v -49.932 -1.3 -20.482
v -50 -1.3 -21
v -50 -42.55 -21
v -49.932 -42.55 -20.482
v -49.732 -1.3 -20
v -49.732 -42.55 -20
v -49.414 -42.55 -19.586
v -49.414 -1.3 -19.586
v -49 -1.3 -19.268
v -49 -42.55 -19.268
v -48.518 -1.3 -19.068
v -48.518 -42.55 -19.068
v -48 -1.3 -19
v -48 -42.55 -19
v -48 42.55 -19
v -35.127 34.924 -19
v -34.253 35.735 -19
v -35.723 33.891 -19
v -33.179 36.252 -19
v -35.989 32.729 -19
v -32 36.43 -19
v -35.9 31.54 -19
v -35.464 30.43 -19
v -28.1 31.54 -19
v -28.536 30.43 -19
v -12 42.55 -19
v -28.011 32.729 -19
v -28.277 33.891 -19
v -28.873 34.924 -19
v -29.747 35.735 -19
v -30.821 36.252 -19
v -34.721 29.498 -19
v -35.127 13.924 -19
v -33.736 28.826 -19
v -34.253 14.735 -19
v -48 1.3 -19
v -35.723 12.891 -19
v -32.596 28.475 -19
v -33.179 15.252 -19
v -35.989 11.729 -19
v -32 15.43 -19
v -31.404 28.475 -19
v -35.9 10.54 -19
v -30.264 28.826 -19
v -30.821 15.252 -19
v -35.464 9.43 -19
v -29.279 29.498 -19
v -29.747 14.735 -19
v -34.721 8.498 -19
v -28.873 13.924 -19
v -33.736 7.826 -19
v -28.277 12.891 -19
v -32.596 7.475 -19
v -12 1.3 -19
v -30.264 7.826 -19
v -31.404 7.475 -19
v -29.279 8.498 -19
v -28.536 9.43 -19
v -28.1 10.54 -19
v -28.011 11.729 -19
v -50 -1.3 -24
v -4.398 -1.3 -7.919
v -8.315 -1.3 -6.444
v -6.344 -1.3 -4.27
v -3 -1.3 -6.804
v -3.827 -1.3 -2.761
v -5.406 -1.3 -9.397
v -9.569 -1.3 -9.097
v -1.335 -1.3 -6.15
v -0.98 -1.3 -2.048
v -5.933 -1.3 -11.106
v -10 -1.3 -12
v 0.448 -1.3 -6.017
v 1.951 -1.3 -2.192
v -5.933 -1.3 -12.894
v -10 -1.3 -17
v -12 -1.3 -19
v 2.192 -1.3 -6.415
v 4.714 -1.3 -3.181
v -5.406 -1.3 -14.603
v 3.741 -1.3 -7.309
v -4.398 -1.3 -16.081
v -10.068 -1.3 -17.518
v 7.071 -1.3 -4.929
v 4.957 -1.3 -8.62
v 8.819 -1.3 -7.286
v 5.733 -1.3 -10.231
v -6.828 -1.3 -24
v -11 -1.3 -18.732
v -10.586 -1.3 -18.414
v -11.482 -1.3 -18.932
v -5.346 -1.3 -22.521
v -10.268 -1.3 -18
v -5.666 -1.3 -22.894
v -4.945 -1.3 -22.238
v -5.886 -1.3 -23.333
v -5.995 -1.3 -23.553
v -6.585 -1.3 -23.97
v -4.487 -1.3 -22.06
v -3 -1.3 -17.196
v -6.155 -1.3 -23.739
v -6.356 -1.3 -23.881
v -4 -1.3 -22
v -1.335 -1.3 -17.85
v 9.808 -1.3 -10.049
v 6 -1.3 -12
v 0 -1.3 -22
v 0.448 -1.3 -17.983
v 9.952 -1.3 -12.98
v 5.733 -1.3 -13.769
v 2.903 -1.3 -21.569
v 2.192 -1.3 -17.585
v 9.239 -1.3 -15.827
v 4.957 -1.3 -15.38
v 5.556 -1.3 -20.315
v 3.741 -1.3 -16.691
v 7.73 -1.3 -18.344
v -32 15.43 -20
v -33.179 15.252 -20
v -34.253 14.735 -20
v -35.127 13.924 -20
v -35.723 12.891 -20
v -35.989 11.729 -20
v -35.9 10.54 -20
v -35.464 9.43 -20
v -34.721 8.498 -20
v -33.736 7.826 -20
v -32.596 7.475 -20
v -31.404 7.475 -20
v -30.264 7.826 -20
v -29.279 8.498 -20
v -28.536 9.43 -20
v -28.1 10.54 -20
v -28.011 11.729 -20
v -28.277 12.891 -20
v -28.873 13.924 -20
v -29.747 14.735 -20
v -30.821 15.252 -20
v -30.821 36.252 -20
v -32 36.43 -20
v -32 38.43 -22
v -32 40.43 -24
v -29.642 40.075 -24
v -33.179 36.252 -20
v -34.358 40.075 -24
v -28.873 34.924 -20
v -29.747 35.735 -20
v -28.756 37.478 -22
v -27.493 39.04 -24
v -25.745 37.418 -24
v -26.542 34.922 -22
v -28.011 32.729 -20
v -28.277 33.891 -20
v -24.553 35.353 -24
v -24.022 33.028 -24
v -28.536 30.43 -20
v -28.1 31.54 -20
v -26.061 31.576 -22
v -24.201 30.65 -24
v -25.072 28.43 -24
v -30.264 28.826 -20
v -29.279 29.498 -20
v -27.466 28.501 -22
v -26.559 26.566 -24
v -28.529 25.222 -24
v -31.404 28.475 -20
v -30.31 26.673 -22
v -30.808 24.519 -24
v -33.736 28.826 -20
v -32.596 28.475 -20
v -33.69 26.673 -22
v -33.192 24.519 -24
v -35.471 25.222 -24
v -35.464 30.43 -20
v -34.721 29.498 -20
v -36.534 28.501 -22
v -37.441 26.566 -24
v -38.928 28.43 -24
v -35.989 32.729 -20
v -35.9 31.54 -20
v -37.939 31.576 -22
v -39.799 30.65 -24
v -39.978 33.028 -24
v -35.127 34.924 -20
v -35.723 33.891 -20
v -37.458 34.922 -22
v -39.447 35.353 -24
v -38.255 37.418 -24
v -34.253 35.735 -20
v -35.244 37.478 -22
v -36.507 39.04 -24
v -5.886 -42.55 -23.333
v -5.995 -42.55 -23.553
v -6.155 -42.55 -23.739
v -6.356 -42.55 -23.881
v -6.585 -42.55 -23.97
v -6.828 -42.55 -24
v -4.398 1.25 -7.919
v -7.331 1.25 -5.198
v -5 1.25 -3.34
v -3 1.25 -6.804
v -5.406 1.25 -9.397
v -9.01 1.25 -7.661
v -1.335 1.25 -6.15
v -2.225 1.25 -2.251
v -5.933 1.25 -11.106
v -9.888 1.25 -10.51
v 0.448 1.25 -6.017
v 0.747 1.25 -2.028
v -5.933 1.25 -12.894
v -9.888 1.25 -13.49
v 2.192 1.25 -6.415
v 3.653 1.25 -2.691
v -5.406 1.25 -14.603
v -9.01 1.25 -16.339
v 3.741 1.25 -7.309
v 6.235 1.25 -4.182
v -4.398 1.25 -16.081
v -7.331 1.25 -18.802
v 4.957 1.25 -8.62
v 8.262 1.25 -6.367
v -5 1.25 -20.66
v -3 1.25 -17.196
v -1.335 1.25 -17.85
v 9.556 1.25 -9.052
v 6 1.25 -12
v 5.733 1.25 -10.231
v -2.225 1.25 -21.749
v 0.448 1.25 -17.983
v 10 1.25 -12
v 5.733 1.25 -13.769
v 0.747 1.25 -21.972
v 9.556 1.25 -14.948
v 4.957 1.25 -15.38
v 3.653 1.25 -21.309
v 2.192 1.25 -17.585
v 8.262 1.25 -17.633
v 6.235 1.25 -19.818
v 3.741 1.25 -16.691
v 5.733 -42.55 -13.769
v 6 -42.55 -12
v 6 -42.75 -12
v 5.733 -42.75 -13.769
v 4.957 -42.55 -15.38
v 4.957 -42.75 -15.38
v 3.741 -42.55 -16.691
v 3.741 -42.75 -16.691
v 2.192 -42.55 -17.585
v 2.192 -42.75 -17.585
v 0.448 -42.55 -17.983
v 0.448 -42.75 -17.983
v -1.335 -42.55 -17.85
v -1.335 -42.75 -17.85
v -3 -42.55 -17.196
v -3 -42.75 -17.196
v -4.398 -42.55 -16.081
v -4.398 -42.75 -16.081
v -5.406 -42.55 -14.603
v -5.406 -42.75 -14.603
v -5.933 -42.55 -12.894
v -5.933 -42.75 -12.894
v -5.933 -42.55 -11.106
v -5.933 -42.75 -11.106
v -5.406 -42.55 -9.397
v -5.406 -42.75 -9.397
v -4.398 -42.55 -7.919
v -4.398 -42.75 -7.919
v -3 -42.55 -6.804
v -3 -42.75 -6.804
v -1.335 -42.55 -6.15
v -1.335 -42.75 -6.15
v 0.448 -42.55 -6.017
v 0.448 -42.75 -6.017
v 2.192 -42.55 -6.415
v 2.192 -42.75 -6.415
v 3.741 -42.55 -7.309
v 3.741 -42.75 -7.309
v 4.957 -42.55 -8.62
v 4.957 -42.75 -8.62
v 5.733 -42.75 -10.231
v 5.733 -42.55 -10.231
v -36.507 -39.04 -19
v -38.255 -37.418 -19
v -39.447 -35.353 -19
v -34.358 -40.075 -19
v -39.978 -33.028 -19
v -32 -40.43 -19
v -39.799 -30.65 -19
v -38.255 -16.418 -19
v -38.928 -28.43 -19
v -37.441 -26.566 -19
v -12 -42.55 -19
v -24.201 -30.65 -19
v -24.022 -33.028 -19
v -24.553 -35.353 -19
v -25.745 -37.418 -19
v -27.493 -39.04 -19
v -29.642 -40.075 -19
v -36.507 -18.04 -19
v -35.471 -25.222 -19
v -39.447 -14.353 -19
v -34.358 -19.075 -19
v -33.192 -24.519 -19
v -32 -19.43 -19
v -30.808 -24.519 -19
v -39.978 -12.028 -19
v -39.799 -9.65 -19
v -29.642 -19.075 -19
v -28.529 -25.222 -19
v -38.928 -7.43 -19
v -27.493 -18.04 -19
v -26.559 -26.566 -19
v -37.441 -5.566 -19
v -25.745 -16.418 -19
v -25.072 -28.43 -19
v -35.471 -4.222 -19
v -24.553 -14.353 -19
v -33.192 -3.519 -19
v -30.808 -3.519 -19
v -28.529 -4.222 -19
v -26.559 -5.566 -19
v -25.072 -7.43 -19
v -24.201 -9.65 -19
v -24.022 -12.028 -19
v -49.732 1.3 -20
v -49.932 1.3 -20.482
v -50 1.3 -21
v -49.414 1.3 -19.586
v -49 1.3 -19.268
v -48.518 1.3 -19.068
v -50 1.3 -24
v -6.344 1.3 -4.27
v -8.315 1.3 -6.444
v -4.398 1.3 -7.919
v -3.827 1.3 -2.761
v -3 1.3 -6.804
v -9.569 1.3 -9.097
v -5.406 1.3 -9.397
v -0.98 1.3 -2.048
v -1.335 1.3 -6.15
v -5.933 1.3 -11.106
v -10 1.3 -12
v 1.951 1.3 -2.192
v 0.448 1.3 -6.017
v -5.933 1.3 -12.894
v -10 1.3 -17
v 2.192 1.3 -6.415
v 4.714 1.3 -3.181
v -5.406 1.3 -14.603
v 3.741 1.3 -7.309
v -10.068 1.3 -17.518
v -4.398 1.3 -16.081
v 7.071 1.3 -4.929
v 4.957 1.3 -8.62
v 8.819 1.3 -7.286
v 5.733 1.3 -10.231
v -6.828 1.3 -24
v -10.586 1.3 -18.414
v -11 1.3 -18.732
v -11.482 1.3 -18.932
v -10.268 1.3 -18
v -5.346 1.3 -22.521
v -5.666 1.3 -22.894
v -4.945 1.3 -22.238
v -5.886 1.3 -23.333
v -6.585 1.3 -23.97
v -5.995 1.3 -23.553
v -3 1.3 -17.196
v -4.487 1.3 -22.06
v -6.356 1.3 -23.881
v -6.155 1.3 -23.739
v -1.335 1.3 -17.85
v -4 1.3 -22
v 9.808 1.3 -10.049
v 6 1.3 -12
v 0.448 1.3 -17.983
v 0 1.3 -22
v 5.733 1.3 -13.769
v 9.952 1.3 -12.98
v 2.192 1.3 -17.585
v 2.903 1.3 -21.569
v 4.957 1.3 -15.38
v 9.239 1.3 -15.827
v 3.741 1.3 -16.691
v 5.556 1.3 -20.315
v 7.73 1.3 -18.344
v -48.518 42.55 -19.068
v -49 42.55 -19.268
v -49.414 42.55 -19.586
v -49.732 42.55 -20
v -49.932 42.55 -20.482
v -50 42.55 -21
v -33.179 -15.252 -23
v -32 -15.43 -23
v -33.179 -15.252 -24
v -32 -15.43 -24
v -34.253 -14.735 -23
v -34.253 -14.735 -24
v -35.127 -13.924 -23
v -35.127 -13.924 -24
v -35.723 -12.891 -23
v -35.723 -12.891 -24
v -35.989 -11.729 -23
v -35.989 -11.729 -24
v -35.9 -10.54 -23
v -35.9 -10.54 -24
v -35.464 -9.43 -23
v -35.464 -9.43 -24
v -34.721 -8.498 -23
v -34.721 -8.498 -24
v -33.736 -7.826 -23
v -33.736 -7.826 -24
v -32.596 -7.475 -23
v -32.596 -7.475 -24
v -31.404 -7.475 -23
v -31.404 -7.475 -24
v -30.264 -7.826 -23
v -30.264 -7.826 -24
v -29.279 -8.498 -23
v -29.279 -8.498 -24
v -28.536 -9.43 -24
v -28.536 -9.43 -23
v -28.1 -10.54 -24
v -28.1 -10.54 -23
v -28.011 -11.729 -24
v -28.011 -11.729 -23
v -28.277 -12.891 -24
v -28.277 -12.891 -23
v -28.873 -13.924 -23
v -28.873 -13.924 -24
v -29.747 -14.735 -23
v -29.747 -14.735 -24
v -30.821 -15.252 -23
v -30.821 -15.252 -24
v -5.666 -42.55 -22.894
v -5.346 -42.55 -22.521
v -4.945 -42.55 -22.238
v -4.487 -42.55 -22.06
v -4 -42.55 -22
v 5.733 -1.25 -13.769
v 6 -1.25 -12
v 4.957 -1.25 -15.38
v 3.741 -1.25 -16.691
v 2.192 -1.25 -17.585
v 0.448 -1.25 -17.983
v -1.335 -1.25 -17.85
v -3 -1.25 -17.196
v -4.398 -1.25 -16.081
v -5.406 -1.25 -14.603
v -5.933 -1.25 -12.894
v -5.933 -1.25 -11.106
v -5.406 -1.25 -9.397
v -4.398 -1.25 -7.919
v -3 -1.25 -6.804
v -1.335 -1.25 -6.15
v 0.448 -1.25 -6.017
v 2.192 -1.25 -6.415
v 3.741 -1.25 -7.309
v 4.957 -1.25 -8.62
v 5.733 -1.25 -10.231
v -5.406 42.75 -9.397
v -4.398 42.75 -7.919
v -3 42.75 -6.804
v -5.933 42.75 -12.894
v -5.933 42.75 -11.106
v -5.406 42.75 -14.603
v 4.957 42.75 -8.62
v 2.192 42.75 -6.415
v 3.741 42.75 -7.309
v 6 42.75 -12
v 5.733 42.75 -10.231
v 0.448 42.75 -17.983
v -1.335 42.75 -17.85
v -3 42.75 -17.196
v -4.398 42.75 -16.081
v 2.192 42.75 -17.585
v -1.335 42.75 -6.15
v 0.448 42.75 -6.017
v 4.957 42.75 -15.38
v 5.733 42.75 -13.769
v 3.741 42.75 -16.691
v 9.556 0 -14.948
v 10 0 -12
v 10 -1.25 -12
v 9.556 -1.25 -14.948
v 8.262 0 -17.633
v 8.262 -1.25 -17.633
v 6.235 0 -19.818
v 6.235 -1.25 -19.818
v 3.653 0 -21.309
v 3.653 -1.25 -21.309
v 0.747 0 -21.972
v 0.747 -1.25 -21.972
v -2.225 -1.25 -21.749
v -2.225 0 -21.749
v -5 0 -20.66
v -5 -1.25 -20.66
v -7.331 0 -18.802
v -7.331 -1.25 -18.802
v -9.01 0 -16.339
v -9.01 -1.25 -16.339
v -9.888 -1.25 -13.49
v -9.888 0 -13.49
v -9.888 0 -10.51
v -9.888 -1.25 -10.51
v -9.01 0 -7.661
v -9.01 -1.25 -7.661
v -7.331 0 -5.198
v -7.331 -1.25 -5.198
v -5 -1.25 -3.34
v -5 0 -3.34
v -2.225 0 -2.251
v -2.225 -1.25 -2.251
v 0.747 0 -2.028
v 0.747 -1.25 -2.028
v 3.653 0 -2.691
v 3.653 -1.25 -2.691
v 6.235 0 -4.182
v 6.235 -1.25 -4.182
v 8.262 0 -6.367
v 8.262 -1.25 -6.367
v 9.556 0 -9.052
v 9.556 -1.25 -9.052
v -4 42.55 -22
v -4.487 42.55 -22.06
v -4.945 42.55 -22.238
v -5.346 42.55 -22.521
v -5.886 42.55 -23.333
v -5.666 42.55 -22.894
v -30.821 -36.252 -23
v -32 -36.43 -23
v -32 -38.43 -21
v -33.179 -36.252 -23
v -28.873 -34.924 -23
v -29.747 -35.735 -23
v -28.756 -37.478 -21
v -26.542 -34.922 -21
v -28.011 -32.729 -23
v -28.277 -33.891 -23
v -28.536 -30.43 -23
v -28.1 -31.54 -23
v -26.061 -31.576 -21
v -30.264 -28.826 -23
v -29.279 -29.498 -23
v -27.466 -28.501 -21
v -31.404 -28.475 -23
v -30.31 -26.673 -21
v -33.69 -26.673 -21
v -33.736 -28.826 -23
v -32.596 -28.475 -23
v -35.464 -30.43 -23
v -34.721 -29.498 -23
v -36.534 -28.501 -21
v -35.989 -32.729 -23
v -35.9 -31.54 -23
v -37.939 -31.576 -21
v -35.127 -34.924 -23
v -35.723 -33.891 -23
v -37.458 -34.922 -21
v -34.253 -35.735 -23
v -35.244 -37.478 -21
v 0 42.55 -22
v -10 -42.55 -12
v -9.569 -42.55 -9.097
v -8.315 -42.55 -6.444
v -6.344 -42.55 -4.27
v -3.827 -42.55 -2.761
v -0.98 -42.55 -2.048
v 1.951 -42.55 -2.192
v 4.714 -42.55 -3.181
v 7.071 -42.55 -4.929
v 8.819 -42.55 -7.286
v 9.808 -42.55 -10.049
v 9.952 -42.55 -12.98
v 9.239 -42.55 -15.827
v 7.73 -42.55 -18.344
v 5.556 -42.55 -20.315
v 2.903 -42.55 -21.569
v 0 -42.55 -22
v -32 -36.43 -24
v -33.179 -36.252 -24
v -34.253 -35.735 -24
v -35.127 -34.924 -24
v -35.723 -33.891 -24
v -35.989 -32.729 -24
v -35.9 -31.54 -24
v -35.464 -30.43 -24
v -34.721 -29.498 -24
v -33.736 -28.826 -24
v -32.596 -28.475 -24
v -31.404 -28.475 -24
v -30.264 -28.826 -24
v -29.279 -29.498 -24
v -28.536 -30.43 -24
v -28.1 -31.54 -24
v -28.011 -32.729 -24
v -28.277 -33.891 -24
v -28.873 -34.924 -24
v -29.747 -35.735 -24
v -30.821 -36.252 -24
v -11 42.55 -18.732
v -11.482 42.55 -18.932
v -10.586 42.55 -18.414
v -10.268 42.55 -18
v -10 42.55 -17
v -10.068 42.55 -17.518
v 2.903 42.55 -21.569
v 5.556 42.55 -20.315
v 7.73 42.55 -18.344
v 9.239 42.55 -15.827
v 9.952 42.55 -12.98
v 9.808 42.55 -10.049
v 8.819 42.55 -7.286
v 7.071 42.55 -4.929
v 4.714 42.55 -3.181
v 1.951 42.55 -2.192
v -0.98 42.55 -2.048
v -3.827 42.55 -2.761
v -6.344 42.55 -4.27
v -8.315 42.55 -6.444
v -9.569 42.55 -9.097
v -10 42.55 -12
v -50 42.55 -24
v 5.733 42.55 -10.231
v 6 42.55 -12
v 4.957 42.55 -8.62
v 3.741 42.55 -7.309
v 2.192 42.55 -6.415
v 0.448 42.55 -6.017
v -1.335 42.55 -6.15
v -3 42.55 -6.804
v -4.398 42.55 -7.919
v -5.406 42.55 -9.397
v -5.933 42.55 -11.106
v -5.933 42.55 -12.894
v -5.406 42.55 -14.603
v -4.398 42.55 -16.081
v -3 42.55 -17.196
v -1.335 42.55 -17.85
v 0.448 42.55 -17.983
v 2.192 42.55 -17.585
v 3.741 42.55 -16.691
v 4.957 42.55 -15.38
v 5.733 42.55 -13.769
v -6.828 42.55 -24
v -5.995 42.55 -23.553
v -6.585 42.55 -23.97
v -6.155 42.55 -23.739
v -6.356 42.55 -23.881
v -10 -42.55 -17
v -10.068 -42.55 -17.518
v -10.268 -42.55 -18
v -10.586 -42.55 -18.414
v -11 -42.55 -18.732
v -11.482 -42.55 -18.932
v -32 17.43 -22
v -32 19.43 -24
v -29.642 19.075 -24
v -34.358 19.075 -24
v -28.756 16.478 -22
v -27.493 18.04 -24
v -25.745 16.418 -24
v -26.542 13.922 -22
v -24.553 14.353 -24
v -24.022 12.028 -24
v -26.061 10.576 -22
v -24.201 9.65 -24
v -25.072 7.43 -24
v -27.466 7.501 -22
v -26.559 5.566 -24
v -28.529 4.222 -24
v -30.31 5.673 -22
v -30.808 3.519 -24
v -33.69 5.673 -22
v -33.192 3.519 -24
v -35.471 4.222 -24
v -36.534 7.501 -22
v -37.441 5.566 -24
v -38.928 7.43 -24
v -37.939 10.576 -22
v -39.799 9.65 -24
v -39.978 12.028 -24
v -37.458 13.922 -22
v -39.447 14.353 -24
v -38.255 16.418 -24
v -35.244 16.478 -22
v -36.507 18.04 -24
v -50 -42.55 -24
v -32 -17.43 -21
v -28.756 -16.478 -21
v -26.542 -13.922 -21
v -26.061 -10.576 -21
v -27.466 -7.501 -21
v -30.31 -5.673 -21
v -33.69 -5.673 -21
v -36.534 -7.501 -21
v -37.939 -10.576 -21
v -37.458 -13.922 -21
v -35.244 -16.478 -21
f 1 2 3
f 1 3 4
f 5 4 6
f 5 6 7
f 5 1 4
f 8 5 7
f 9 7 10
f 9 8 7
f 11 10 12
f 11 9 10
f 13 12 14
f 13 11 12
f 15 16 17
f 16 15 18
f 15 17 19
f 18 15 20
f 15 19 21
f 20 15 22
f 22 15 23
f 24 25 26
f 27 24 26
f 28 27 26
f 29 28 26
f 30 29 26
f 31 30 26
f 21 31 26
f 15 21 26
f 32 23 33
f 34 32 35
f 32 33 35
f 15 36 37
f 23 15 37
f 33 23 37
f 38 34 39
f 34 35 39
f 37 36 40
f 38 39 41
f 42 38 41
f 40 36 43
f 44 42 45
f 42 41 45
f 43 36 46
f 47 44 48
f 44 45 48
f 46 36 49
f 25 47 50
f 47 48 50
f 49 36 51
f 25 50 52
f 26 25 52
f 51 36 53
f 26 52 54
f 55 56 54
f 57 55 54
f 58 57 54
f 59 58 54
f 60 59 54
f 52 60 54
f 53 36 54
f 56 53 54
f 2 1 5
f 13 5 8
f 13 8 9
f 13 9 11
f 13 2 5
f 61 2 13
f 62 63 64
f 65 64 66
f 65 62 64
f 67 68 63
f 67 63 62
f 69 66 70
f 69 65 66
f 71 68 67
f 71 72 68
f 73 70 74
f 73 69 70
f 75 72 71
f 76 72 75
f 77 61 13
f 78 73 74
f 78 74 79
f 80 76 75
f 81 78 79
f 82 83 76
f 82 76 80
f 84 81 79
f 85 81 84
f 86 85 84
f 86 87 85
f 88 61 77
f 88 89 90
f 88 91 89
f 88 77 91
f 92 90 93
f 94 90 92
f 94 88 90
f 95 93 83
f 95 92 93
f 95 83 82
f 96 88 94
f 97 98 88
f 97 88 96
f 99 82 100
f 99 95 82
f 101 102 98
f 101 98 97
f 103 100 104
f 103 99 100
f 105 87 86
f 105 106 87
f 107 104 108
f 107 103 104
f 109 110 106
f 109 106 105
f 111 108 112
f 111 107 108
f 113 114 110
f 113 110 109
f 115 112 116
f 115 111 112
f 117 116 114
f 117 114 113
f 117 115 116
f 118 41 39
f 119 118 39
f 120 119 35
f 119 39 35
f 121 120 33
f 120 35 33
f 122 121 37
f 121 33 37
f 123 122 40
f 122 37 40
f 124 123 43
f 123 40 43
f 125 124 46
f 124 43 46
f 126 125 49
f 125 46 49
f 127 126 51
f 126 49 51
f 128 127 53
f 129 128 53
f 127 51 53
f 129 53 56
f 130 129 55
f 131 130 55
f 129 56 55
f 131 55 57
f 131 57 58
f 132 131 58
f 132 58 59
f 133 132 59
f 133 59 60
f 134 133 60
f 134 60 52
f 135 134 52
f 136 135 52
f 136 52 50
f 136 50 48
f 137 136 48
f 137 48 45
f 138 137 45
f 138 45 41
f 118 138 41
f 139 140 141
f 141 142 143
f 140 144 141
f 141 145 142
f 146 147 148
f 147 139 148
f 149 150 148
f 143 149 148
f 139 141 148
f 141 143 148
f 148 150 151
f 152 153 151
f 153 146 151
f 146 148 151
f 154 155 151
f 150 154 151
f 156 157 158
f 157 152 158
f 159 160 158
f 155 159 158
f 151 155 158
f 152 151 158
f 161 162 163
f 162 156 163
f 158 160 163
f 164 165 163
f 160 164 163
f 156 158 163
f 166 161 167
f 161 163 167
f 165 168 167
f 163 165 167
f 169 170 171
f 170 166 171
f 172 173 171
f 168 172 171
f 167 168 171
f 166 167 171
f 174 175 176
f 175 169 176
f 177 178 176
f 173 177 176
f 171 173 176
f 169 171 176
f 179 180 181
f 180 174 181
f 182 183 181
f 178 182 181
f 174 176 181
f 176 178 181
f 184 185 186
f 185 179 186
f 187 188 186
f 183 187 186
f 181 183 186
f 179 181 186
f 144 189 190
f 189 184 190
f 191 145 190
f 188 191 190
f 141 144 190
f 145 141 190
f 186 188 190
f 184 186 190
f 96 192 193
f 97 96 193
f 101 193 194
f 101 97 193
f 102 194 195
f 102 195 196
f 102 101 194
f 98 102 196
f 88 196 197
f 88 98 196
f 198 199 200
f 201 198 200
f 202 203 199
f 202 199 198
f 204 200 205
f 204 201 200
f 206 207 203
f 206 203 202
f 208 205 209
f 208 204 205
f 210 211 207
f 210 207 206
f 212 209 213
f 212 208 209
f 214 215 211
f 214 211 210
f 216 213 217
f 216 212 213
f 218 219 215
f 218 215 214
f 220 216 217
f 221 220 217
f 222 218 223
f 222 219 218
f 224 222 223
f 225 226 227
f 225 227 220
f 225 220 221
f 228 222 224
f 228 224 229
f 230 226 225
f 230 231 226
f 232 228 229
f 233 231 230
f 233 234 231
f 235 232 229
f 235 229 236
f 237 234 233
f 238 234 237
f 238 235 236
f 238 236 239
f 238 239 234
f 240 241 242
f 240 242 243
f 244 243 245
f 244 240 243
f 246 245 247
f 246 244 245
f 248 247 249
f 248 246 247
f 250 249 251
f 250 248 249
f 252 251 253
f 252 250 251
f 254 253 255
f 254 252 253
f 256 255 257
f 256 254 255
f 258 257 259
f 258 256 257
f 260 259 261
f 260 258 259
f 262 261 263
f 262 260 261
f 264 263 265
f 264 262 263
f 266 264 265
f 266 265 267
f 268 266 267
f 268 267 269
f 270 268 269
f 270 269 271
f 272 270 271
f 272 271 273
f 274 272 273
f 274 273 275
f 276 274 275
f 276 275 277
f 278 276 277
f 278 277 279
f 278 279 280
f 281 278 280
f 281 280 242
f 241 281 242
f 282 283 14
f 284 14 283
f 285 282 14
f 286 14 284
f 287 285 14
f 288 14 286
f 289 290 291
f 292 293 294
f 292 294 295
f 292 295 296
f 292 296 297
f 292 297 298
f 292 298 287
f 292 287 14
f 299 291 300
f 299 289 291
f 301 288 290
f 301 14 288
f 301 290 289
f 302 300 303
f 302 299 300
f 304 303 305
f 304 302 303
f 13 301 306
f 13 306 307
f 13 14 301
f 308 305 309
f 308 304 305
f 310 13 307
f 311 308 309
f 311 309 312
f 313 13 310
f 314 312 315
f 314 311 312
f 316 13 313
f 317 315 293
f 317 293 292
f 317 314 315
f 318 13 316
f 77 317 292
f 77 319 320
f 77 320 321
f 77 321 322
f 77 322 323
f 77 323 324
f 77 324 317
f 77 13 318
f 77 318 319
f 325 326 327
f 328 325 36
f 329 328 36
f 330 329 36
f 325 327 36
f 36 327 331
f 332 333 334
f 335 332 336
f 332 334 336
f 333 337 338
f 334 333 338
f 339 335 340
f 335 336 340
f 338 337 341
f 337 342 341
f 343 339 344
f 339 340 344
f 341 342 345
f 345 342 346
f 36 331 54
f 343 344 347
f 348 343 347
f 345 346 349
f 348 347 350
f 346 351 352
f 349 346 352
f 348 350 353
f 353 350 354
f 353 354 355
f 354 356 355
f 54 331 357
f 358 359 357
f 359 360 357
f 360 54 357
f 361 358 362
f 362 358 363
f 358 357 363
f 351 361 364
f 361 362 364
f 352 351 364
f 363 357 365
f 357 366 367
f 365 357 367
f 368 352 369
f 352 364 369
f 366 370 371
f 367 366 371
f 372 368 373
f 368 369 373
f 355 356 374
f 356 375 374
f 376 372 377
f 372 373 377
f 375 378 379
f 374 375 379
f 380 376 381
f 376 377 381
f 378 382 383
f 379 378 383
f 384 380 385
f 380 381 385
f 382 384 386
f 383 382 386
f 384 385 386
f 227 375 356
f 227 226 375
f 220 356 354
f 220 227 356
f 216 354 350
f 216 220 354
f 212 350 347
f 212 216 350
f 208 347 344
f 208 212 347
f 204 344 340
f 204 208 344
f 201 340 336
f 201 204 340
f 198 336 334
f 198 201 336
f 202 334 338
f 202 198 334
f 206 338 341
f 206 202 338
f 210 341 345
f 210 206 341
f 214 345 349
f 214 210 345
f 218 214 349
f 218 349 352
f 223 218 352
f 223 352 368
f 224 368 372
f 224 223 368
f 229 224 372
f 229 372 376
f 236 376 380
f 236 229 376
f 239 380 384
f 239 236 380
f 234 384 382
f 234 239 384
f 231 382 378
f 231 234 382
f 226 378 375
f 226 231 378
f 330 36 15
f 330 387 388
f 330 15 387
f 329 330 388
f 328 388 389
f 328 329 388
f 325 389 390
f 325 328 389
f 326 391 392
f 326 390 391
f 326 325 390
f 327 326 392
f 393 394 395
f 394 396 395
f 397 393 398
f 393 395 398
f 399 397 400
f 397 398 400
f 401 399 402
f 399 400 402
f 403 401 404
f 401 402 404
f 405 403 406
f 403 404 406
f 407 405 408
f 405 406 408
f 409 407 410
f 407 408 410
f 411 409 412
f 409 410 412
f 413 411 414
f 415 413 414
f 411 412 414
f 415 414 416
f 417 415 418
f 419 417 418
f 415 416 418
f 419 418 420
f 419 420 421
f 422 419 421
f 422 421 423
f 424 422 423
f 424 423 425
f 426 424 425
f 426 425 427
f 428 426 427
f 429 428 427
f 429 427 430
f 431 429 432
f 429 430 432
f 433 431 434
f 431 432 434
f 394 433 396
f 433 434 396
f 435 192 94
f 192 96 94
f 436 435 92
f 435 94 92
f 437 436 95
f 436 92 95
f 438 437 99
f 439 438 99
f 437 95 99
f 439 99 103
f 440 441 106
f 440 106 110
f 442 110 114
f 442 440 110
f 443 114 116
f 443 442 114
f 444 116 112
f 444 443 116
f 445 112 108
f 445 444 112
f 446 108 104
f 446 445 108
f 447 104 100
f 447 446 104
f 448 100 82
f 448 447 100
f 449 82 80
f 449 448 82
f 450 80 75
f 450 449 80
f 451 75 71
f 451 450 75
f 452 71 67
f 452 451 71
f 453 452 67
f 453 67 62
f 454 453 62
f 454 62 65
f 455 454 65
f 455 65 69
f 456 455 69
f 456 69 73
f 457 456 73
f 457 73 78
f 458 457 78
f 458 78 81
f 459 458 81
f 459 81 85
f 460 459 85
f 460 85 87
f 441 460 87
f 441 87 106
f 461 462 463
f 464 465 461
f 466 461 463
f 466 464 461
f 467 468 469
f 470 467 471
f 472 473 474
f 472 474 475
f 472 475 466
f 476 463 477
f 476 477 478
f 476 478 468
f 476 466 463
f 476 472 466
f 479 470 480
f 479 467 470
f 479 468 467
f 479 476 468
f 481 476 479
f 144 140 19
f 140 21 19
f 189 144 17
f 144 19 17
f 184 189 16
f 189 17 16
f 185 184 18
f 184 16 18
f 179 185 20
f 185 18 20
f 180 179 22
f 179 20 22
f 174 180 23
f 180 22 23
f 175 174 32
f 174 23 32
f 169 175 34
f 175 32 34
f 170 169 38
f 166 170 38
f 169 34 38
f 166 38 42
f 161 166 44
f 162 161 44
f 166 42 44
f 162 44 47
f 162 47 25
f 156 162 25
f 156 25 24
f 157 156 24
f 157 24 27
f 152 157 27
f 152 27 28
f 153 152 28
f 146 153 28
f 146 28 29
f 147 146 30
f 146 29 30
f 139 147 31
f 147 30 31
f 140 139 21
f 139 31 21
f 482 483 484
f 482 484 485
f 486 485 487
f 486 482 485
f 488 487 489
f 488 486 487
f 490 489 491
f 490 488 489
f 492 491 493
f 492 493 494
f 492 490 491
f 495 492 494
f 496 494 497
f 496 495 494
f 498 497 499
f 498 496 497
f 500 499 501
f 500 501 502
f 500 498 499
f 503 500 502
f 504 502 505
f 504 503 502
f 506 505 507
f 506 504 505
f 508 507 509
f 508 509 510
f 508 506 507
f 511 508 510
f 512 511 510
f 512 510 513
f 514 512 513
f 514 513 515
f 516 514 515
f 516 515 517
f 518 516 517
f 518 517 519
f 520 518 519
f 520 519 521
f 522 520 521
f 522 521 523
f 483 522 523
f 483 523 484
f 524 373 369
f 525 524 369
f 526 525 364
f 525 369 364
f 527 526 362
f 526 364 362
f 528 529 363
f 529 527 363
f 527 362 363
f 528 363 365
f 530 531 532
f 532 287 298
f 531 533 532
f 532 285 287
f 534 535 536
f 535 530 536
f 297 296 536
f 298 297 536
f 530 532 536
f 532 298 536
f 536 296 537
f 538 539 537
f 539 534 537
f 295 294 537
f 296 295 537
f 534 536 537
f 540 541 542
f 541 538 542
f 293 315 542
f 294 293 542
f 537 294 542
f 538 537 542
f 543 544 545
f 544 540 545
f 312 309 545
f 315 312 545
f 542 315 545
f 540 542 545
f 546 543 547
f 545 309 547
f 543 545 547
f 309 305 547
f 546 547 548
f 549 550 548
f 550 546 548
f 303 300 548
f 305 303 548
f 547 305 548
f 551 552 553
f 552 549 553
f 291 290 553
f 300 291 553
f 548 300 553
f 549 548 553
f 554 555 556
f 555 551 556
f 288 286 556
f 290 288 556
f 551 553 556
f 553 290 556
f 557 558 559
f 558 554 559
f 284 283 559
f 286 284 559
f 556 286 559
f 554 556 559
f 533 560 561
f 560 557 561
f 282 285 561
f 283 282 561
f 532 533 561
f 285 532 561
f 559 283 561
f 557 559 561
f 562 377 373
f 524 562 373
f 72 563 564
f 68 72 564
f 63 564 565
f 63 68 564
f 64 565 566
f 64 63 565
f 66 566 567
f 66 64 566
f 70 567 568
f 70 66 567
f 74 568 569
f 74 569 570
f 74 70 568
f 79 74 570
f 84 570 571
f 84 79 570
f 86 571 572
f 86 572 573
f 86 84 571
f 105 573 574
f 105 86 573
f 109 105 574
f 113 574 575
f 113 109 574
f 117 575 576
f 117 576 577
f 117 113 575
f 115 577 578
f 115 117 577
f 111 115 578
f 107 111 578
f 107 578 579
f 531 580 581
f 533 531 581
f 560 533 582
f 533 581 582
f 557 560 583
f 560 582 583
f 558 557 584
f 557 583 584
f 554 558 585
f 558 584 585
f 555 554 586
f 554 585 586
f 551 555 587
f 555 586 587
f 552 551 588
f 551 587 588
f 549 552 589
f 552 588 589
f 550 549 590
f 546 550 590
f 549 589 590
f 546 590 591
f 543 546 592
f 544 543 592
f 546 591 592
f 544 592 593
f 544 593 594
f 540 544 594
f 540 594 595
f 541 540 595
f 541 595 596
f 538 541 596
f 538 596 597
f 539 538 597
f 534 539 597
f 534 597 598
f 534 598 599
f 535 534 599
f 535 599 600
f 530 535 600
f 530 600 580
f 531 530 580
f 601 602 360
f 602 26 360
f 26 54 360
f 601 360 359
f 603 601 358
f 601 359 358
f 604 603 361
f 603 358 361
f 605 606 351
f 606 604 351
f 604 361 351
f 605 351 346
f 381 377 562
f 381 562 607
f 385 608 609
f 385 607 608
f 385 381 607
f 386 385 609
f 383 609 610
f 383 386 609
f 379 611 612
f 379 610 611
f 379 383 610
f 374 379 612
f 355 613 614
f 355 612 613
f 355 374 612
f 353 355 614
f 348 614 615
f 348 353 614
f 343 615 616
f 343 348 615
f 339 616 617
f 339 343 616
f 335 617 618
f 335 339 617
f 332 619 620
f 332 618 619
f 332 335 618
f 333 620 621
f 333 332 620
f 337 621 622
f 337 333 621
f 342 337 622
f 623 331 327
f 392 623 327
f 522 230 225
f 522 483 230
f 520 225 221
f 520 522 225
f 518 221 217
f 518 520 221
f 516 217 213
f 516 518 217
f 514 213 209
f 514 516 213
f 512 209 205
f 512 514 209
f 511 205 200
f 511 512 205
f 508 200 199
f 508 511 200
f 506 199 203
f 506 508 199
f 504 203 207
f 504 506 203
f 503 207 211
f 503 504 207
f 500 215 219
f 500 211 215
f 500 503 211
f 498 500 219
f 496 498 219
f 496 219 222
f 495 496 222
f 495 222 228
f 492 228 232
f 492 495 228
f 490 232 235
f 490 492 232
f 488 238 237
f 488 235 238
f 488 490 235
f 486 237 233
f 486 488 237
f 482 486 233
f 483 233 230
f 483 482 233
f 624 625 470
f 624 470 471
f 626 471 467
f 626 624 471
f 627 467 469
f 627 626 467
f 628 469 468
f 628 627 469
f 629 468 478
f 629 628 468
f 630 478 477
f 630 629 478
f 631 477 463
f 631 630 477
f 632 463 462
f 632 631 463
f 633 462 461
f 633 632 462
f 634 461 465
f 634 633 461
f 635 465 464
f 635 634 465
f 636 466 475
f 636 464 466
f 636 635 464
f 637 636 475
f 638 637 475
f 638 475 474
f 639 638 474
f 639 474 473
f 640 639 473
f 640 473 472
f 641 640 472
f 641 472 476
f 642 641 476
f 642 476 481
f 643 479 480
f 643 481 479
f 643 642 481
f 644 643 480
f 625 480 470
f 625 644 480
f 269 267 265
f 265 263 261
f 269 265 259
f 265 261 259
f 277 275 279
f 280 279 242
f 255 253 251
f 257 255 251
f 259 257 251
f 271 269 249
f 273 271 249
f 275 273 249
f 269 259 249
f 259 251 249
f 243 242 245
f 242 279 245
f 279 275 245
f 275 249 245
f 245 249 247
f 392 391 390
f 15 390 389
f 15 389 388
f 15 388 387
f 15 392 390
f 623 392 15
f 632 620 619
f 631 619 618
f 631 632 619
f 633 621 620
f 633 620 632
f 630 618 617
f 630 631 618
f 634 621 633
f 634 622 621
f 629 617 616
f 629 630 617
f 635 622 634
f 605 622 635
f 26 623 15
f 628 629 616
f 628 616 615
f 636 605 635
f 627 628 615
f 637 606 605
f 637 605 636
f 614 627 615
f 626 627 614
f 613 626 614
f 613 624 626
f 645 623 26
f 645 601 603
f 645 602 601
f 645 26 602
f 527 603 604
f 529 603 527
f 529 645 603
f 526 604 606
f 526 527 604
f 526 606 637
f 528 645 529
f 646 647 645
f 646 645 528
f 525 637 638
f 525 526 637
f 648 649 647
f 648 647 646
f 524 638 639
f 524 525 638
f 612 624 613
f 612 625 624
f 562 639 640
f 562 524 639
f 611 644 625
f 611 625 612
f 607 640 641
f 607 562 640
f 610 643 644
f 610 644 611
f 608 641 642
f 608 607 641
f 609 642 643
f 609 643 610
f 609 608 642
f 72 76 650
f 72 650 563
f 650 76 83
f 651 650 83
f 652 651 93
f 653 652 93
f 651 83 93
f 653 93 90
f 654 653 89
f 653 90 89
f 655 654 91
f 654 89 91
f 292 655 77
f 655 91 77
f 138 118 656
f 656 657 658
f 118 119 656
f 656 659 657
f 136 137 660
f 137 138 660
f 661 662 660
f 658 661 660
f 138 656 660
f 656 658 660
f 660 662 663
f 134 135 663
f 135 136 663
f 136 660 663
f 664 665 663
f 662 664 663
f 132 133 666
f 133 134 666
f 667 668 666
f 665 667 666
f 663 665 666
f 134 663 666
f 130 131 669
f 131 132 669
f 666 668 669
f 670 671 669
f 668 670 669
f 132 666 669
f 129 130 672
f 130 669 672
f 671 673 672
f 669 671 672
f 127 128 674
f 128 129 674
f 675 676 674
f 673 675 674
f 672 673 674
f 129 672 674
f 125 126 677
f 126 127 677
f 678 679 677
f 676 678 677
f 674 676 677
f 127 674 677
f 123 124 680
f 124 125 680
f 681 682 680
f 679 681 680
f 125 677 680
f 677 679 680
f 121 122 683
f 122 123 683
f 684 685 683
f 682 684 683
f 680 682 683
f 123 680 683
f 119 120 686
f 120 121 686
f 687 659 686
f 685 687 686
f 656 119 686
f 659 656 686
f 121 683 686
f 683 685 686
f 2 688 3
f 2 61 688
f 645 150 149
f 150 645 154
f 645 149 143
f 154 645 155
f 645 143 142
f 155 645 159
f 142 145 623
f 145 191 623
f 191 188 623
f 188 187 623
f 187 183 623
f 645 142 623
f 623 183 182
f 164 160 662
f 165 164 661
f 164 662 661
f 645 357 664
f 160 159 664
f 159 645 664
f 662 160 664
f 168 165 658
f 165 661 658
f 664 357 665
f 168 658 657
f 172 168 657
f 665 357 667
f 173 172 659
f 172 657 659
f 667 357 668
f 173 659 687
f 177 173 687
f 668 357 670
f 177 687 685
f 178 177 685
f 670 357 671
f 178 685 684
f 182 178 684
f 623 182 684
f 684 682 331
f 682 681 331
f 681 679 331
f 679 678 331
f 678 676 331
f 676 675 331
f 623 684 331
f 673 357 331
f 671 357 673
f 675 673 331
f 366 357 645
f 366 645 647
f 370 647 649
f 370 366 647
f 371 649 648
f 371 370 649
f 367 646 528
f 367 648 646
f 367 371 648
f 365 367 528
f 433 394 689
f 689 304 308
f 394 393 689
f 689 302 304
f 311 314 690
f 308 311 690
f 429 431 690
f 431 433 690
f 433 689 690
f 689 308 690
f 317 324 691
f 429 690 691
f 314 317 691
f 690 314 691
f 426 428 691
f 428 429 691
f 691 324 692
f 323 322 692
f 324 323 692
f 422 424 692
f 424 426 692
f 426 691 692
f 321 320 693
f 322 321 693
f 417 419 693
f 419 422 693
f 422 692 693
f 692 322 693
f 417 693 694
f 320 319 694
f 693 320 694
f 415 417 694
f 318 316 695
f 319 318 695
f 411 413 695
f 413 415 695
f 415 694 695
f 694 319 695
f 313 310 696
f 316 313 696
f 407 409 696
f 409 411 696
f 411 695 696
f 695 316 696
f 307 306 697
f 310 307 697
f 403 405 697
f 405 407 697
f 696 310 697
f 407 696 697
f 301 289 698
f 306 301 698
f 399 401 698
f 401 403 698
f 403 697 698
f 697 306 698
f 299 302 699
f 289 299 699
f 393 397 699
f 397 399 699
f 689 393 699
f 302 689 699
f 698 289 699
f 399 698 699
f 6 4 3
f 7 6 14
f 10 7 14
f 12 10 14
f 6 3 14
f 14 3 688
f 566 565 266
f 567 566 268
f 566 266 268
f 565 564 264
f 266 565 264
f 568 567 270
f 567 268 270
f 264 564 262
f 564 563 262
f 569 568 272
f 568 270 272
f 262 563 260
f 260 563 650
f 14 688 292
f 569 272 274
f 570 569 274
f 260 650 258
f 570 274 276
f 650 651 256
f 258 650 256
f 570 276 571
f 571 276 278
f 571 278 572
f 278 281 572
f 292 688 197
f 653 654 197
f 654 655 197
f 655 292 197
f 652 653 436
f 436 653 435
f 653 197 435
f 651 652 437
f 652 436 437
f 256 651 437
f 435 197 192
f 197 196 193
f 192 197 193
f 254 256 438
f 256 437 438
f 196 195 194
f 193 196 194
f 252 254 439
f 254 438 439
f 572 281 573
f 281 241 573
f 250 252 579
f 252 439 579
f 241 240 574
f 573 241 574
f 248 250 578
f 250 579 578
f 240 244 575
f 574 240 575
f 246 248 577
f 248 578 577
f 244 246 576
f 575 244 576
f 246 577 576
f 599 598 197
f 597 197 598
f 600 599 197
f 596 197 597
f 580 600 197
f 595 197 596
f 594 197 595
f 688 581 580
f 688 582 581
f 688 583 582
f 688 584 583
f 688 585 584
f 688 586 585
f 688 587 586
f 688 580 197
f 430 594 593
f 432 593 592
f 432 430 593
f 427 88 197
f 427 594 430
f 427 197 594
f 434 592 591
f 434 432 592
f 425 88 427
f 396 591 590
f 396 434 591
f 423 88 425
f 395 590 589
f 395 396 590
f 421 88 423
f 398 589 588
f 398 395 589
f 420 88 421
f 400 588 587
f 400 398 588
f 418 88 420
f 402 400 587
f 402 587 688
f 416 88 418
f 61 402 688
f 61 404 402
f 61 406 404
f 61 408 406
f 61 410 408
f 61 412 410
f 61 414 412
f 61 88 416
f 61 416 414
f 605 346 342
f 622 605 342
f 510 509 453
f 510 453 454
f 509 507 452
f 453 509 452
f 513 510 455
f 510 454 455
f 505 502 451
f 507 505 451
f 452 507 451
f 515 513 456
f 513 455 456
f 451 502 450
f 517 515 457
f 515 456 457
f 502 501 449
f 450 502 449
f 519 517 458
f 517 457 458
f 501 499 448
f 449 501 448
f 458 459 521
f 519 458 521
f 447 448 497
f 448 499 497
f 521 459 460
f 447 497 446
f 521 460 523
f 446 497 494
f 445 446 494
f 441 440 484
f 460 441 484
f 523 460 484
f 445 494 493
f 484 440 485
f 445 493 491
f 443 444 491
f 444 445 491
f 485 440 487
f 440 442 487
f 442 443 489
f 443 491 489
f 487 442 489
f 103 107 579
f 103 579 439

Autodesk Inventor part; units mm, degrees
sketch "Skizze_34" plane through (0, 0, 0) normal (0, 1, 0) x (1, 0, 0)
  circle A0 centre (0, 12) radius 10
extrude "Extrusion1" add sketch "Skizze_34" along normal mid plane 2.5
sketch "Skizze_35" plane through (0, 0, 0) normal (0, 1, 0) x (1, 0, 0)
  circle A0 centre (0, 12) radius 6
extrude "Extrusion2" add sketch "Skizze_35" along normal mid plane 85.5
sketch "Skizze_36" plane through (0, -1.3, 0) normal (0, 1, 0) x (1, 0, 0)
  line L0 (-50, 24) -> (-50, 21)
  arc A0 (-50, 21) -> (-48, 19) centre (-48, 21) ccw
  line L1 (-48, 19) -> (-12, 19)
  arc A1 (-10, 17) -> (-12, 19) centre (-12, 17) ccw
  line L2 (-10, 17) -> (-10, 12)
  arc A2 (-10, 12) -> (0, 22) centre (0, 12) ccw
  line L3 (0, 22) -> (-4, 22)
  arc A3 (-5.8856, 23.3333) -> (-4, 22) centre (-4, 24) ccw
  arc A4 (-5.8856, 23.3333) -> (-6.8284, 24) centre (-6.8284, 23) ccw
  line L4 (-6.8284, 24) -> (-50, 24)
  circle A5 centre (0, 12) radius 6
extrude "Extrusion3" add sketch "Skizze_36" against normal blind 41.25
sketch "Skizze_37" plane through (0, 1.3, 0) normal (0, 1, 0) x (1, 0, 0)
  line L0 (-50, 24) -> (-50, 21)
  arc A0 (-50, 21) -> (-48, 19) centre (-48, 21) ccw
  line L1 (-48, 19) -> (-12, 19)
  arc A1 (-10, 17) -> (-12, 19) centre (-12, 17) ccw
  line L2 (-10, 17) -> (-10, 12)
  arc A2 (-10, 12) -> (0, 22) centre (0, 12) ccw
  line L3 (0, 22) -> (-4, 22)
  arc A3 (-5.8856, 23.3333) -> (-4, 22) centre (-4, 24) ccw
  arc A4 (-5.8856, 23.3333) -> (-6.8284, 24) centre (-6.8284, 23) ccw
  line L4 (-6.8284, 24) -> (-50, 24)
  circle A5 centre (0, 12) radius 6
extrude "Extrusion4" add sketch "Skizze_37" along normal blind 41.25
sketch "Sketch5" plane through (-6.8284, 1.3, -24) normal (0, 0, -1) x (-1, 0, 0)
  point P0 (25.1716, 10.13)
hole "Drilling 1" at (-32, 11.43, -24) direction (0, 0, 1) diameter 8 depth 5 countersink diameter 16 countersink angle 90
sketch "Sketch6" plane through (-6.8284, 1.3, -24) normal (0, 0, -1) x (-1, 0, 0)
  point P0 (25.1716, 31.13)
hole "Drilling 2" at (-32, 32.43, -24) direction (0, 0, 1) diameter 8 depth 5 countersink diameter 16 countersink angle 90
sketch "Sketch7" plane through (-48, -1.3, -19) normal (0, 0, 1) x (1, 0, 0)
  point P0 (16, -10.13)
hole "Drilling 3" at (-32, -11.43, -19) direction (0, 0, -1) diameter 8 depth 5 countersink diameter 16 countersink angle 90
sketch "Sketch8" plane through (-48, -1.3, -19) normal (0, 0, 1) x (1, 0, 0)
  point P0 (16, -31.13)
hole "Drilling 4" at (-32, -32.43, -19) direction (0, 0, -1) diameter 8 depth 5 countersink diameter 16 countersink angle 90
ref_plane "side_2a_XY" through (-32, -21.925, -19) normal (0, 0, 1) x (1, 0, 0)
ref_plane "side_2a_YZ" through (-32, -21.925, -19) normal (1, 0, 0) x (0, 1, 0)
ref_plane "side_2a_ZX" through (-32, -21.925, -19) normal (0, 1, 0) x (0, 0, 1)
ref_plane "side_2b_XY" through (-32, -21.925, -24) normal (0, 0, -1) x (1, 0, 0)
ref_plane "side_2b_YZ" through (-32, -21.925, -24) normal (1, 0, 0) x (0, -1, 0)
ref_plane "side_2b_ZX" through (-32, -21.925, -24) normal (0, -1, 0) x (0, 0, -1)
ref_plane "side_1b_XY" through (-32, 21.925, -19) normal (0, 0, 1) x (1, 0, 0)
ref_plane "side_1b_YZ" through (-32, 21.925, -19) normal (1, 0, 0) x (0, 1, 0)
ref_plane "side_1b_ZX" through (-32, 21.925, -19) normal (0, 1, 0) x (0, 0, 1)
ref_plane "side_3b_XY" through (-32, 21.925, -19) normal (0, 0, 1) x (1, 0, 0)
ref_plane "side_3b_YZ" through (-32, 21.925, -19) normal (1, 0, 0) x (0, 1, 0)
ref_plane "side_3b_ZX" through (-32, 21.925, -19) normal (0, 1, 0) x (0, 0, 1)
ref_plane "side_1a_XY" through (-32, 21.925, -24) normal (0, 0, -1) x (1, 0, 0)
ref_plane "side_1a_YZ" through (-32, 21.925, -24) normal (1, 0, 0) x (0, -1, 0)
ref_plane "side_1a_ZX" through (-32, 21.925, -24) normal (0, -1, 0) x (0, 0, -1)
ref_plane "side_3a_XY" through (-32, 21.925, -24) normal (0, 0, -1) x (1, 0, 0)
ref_plane "side_3a_YZ" through (-32, 21.925, -24) normal (1, 0, 0) x (0, -1, 0)
ref_plane "side_3a_ZX" through (-32, 21.925, -24) normal (0, -1, 0) x (0, 0, -1)
properties part number "MayTec 1.62.842032085_Alu hinges, heavy, type 20 PG 40 (0)"
